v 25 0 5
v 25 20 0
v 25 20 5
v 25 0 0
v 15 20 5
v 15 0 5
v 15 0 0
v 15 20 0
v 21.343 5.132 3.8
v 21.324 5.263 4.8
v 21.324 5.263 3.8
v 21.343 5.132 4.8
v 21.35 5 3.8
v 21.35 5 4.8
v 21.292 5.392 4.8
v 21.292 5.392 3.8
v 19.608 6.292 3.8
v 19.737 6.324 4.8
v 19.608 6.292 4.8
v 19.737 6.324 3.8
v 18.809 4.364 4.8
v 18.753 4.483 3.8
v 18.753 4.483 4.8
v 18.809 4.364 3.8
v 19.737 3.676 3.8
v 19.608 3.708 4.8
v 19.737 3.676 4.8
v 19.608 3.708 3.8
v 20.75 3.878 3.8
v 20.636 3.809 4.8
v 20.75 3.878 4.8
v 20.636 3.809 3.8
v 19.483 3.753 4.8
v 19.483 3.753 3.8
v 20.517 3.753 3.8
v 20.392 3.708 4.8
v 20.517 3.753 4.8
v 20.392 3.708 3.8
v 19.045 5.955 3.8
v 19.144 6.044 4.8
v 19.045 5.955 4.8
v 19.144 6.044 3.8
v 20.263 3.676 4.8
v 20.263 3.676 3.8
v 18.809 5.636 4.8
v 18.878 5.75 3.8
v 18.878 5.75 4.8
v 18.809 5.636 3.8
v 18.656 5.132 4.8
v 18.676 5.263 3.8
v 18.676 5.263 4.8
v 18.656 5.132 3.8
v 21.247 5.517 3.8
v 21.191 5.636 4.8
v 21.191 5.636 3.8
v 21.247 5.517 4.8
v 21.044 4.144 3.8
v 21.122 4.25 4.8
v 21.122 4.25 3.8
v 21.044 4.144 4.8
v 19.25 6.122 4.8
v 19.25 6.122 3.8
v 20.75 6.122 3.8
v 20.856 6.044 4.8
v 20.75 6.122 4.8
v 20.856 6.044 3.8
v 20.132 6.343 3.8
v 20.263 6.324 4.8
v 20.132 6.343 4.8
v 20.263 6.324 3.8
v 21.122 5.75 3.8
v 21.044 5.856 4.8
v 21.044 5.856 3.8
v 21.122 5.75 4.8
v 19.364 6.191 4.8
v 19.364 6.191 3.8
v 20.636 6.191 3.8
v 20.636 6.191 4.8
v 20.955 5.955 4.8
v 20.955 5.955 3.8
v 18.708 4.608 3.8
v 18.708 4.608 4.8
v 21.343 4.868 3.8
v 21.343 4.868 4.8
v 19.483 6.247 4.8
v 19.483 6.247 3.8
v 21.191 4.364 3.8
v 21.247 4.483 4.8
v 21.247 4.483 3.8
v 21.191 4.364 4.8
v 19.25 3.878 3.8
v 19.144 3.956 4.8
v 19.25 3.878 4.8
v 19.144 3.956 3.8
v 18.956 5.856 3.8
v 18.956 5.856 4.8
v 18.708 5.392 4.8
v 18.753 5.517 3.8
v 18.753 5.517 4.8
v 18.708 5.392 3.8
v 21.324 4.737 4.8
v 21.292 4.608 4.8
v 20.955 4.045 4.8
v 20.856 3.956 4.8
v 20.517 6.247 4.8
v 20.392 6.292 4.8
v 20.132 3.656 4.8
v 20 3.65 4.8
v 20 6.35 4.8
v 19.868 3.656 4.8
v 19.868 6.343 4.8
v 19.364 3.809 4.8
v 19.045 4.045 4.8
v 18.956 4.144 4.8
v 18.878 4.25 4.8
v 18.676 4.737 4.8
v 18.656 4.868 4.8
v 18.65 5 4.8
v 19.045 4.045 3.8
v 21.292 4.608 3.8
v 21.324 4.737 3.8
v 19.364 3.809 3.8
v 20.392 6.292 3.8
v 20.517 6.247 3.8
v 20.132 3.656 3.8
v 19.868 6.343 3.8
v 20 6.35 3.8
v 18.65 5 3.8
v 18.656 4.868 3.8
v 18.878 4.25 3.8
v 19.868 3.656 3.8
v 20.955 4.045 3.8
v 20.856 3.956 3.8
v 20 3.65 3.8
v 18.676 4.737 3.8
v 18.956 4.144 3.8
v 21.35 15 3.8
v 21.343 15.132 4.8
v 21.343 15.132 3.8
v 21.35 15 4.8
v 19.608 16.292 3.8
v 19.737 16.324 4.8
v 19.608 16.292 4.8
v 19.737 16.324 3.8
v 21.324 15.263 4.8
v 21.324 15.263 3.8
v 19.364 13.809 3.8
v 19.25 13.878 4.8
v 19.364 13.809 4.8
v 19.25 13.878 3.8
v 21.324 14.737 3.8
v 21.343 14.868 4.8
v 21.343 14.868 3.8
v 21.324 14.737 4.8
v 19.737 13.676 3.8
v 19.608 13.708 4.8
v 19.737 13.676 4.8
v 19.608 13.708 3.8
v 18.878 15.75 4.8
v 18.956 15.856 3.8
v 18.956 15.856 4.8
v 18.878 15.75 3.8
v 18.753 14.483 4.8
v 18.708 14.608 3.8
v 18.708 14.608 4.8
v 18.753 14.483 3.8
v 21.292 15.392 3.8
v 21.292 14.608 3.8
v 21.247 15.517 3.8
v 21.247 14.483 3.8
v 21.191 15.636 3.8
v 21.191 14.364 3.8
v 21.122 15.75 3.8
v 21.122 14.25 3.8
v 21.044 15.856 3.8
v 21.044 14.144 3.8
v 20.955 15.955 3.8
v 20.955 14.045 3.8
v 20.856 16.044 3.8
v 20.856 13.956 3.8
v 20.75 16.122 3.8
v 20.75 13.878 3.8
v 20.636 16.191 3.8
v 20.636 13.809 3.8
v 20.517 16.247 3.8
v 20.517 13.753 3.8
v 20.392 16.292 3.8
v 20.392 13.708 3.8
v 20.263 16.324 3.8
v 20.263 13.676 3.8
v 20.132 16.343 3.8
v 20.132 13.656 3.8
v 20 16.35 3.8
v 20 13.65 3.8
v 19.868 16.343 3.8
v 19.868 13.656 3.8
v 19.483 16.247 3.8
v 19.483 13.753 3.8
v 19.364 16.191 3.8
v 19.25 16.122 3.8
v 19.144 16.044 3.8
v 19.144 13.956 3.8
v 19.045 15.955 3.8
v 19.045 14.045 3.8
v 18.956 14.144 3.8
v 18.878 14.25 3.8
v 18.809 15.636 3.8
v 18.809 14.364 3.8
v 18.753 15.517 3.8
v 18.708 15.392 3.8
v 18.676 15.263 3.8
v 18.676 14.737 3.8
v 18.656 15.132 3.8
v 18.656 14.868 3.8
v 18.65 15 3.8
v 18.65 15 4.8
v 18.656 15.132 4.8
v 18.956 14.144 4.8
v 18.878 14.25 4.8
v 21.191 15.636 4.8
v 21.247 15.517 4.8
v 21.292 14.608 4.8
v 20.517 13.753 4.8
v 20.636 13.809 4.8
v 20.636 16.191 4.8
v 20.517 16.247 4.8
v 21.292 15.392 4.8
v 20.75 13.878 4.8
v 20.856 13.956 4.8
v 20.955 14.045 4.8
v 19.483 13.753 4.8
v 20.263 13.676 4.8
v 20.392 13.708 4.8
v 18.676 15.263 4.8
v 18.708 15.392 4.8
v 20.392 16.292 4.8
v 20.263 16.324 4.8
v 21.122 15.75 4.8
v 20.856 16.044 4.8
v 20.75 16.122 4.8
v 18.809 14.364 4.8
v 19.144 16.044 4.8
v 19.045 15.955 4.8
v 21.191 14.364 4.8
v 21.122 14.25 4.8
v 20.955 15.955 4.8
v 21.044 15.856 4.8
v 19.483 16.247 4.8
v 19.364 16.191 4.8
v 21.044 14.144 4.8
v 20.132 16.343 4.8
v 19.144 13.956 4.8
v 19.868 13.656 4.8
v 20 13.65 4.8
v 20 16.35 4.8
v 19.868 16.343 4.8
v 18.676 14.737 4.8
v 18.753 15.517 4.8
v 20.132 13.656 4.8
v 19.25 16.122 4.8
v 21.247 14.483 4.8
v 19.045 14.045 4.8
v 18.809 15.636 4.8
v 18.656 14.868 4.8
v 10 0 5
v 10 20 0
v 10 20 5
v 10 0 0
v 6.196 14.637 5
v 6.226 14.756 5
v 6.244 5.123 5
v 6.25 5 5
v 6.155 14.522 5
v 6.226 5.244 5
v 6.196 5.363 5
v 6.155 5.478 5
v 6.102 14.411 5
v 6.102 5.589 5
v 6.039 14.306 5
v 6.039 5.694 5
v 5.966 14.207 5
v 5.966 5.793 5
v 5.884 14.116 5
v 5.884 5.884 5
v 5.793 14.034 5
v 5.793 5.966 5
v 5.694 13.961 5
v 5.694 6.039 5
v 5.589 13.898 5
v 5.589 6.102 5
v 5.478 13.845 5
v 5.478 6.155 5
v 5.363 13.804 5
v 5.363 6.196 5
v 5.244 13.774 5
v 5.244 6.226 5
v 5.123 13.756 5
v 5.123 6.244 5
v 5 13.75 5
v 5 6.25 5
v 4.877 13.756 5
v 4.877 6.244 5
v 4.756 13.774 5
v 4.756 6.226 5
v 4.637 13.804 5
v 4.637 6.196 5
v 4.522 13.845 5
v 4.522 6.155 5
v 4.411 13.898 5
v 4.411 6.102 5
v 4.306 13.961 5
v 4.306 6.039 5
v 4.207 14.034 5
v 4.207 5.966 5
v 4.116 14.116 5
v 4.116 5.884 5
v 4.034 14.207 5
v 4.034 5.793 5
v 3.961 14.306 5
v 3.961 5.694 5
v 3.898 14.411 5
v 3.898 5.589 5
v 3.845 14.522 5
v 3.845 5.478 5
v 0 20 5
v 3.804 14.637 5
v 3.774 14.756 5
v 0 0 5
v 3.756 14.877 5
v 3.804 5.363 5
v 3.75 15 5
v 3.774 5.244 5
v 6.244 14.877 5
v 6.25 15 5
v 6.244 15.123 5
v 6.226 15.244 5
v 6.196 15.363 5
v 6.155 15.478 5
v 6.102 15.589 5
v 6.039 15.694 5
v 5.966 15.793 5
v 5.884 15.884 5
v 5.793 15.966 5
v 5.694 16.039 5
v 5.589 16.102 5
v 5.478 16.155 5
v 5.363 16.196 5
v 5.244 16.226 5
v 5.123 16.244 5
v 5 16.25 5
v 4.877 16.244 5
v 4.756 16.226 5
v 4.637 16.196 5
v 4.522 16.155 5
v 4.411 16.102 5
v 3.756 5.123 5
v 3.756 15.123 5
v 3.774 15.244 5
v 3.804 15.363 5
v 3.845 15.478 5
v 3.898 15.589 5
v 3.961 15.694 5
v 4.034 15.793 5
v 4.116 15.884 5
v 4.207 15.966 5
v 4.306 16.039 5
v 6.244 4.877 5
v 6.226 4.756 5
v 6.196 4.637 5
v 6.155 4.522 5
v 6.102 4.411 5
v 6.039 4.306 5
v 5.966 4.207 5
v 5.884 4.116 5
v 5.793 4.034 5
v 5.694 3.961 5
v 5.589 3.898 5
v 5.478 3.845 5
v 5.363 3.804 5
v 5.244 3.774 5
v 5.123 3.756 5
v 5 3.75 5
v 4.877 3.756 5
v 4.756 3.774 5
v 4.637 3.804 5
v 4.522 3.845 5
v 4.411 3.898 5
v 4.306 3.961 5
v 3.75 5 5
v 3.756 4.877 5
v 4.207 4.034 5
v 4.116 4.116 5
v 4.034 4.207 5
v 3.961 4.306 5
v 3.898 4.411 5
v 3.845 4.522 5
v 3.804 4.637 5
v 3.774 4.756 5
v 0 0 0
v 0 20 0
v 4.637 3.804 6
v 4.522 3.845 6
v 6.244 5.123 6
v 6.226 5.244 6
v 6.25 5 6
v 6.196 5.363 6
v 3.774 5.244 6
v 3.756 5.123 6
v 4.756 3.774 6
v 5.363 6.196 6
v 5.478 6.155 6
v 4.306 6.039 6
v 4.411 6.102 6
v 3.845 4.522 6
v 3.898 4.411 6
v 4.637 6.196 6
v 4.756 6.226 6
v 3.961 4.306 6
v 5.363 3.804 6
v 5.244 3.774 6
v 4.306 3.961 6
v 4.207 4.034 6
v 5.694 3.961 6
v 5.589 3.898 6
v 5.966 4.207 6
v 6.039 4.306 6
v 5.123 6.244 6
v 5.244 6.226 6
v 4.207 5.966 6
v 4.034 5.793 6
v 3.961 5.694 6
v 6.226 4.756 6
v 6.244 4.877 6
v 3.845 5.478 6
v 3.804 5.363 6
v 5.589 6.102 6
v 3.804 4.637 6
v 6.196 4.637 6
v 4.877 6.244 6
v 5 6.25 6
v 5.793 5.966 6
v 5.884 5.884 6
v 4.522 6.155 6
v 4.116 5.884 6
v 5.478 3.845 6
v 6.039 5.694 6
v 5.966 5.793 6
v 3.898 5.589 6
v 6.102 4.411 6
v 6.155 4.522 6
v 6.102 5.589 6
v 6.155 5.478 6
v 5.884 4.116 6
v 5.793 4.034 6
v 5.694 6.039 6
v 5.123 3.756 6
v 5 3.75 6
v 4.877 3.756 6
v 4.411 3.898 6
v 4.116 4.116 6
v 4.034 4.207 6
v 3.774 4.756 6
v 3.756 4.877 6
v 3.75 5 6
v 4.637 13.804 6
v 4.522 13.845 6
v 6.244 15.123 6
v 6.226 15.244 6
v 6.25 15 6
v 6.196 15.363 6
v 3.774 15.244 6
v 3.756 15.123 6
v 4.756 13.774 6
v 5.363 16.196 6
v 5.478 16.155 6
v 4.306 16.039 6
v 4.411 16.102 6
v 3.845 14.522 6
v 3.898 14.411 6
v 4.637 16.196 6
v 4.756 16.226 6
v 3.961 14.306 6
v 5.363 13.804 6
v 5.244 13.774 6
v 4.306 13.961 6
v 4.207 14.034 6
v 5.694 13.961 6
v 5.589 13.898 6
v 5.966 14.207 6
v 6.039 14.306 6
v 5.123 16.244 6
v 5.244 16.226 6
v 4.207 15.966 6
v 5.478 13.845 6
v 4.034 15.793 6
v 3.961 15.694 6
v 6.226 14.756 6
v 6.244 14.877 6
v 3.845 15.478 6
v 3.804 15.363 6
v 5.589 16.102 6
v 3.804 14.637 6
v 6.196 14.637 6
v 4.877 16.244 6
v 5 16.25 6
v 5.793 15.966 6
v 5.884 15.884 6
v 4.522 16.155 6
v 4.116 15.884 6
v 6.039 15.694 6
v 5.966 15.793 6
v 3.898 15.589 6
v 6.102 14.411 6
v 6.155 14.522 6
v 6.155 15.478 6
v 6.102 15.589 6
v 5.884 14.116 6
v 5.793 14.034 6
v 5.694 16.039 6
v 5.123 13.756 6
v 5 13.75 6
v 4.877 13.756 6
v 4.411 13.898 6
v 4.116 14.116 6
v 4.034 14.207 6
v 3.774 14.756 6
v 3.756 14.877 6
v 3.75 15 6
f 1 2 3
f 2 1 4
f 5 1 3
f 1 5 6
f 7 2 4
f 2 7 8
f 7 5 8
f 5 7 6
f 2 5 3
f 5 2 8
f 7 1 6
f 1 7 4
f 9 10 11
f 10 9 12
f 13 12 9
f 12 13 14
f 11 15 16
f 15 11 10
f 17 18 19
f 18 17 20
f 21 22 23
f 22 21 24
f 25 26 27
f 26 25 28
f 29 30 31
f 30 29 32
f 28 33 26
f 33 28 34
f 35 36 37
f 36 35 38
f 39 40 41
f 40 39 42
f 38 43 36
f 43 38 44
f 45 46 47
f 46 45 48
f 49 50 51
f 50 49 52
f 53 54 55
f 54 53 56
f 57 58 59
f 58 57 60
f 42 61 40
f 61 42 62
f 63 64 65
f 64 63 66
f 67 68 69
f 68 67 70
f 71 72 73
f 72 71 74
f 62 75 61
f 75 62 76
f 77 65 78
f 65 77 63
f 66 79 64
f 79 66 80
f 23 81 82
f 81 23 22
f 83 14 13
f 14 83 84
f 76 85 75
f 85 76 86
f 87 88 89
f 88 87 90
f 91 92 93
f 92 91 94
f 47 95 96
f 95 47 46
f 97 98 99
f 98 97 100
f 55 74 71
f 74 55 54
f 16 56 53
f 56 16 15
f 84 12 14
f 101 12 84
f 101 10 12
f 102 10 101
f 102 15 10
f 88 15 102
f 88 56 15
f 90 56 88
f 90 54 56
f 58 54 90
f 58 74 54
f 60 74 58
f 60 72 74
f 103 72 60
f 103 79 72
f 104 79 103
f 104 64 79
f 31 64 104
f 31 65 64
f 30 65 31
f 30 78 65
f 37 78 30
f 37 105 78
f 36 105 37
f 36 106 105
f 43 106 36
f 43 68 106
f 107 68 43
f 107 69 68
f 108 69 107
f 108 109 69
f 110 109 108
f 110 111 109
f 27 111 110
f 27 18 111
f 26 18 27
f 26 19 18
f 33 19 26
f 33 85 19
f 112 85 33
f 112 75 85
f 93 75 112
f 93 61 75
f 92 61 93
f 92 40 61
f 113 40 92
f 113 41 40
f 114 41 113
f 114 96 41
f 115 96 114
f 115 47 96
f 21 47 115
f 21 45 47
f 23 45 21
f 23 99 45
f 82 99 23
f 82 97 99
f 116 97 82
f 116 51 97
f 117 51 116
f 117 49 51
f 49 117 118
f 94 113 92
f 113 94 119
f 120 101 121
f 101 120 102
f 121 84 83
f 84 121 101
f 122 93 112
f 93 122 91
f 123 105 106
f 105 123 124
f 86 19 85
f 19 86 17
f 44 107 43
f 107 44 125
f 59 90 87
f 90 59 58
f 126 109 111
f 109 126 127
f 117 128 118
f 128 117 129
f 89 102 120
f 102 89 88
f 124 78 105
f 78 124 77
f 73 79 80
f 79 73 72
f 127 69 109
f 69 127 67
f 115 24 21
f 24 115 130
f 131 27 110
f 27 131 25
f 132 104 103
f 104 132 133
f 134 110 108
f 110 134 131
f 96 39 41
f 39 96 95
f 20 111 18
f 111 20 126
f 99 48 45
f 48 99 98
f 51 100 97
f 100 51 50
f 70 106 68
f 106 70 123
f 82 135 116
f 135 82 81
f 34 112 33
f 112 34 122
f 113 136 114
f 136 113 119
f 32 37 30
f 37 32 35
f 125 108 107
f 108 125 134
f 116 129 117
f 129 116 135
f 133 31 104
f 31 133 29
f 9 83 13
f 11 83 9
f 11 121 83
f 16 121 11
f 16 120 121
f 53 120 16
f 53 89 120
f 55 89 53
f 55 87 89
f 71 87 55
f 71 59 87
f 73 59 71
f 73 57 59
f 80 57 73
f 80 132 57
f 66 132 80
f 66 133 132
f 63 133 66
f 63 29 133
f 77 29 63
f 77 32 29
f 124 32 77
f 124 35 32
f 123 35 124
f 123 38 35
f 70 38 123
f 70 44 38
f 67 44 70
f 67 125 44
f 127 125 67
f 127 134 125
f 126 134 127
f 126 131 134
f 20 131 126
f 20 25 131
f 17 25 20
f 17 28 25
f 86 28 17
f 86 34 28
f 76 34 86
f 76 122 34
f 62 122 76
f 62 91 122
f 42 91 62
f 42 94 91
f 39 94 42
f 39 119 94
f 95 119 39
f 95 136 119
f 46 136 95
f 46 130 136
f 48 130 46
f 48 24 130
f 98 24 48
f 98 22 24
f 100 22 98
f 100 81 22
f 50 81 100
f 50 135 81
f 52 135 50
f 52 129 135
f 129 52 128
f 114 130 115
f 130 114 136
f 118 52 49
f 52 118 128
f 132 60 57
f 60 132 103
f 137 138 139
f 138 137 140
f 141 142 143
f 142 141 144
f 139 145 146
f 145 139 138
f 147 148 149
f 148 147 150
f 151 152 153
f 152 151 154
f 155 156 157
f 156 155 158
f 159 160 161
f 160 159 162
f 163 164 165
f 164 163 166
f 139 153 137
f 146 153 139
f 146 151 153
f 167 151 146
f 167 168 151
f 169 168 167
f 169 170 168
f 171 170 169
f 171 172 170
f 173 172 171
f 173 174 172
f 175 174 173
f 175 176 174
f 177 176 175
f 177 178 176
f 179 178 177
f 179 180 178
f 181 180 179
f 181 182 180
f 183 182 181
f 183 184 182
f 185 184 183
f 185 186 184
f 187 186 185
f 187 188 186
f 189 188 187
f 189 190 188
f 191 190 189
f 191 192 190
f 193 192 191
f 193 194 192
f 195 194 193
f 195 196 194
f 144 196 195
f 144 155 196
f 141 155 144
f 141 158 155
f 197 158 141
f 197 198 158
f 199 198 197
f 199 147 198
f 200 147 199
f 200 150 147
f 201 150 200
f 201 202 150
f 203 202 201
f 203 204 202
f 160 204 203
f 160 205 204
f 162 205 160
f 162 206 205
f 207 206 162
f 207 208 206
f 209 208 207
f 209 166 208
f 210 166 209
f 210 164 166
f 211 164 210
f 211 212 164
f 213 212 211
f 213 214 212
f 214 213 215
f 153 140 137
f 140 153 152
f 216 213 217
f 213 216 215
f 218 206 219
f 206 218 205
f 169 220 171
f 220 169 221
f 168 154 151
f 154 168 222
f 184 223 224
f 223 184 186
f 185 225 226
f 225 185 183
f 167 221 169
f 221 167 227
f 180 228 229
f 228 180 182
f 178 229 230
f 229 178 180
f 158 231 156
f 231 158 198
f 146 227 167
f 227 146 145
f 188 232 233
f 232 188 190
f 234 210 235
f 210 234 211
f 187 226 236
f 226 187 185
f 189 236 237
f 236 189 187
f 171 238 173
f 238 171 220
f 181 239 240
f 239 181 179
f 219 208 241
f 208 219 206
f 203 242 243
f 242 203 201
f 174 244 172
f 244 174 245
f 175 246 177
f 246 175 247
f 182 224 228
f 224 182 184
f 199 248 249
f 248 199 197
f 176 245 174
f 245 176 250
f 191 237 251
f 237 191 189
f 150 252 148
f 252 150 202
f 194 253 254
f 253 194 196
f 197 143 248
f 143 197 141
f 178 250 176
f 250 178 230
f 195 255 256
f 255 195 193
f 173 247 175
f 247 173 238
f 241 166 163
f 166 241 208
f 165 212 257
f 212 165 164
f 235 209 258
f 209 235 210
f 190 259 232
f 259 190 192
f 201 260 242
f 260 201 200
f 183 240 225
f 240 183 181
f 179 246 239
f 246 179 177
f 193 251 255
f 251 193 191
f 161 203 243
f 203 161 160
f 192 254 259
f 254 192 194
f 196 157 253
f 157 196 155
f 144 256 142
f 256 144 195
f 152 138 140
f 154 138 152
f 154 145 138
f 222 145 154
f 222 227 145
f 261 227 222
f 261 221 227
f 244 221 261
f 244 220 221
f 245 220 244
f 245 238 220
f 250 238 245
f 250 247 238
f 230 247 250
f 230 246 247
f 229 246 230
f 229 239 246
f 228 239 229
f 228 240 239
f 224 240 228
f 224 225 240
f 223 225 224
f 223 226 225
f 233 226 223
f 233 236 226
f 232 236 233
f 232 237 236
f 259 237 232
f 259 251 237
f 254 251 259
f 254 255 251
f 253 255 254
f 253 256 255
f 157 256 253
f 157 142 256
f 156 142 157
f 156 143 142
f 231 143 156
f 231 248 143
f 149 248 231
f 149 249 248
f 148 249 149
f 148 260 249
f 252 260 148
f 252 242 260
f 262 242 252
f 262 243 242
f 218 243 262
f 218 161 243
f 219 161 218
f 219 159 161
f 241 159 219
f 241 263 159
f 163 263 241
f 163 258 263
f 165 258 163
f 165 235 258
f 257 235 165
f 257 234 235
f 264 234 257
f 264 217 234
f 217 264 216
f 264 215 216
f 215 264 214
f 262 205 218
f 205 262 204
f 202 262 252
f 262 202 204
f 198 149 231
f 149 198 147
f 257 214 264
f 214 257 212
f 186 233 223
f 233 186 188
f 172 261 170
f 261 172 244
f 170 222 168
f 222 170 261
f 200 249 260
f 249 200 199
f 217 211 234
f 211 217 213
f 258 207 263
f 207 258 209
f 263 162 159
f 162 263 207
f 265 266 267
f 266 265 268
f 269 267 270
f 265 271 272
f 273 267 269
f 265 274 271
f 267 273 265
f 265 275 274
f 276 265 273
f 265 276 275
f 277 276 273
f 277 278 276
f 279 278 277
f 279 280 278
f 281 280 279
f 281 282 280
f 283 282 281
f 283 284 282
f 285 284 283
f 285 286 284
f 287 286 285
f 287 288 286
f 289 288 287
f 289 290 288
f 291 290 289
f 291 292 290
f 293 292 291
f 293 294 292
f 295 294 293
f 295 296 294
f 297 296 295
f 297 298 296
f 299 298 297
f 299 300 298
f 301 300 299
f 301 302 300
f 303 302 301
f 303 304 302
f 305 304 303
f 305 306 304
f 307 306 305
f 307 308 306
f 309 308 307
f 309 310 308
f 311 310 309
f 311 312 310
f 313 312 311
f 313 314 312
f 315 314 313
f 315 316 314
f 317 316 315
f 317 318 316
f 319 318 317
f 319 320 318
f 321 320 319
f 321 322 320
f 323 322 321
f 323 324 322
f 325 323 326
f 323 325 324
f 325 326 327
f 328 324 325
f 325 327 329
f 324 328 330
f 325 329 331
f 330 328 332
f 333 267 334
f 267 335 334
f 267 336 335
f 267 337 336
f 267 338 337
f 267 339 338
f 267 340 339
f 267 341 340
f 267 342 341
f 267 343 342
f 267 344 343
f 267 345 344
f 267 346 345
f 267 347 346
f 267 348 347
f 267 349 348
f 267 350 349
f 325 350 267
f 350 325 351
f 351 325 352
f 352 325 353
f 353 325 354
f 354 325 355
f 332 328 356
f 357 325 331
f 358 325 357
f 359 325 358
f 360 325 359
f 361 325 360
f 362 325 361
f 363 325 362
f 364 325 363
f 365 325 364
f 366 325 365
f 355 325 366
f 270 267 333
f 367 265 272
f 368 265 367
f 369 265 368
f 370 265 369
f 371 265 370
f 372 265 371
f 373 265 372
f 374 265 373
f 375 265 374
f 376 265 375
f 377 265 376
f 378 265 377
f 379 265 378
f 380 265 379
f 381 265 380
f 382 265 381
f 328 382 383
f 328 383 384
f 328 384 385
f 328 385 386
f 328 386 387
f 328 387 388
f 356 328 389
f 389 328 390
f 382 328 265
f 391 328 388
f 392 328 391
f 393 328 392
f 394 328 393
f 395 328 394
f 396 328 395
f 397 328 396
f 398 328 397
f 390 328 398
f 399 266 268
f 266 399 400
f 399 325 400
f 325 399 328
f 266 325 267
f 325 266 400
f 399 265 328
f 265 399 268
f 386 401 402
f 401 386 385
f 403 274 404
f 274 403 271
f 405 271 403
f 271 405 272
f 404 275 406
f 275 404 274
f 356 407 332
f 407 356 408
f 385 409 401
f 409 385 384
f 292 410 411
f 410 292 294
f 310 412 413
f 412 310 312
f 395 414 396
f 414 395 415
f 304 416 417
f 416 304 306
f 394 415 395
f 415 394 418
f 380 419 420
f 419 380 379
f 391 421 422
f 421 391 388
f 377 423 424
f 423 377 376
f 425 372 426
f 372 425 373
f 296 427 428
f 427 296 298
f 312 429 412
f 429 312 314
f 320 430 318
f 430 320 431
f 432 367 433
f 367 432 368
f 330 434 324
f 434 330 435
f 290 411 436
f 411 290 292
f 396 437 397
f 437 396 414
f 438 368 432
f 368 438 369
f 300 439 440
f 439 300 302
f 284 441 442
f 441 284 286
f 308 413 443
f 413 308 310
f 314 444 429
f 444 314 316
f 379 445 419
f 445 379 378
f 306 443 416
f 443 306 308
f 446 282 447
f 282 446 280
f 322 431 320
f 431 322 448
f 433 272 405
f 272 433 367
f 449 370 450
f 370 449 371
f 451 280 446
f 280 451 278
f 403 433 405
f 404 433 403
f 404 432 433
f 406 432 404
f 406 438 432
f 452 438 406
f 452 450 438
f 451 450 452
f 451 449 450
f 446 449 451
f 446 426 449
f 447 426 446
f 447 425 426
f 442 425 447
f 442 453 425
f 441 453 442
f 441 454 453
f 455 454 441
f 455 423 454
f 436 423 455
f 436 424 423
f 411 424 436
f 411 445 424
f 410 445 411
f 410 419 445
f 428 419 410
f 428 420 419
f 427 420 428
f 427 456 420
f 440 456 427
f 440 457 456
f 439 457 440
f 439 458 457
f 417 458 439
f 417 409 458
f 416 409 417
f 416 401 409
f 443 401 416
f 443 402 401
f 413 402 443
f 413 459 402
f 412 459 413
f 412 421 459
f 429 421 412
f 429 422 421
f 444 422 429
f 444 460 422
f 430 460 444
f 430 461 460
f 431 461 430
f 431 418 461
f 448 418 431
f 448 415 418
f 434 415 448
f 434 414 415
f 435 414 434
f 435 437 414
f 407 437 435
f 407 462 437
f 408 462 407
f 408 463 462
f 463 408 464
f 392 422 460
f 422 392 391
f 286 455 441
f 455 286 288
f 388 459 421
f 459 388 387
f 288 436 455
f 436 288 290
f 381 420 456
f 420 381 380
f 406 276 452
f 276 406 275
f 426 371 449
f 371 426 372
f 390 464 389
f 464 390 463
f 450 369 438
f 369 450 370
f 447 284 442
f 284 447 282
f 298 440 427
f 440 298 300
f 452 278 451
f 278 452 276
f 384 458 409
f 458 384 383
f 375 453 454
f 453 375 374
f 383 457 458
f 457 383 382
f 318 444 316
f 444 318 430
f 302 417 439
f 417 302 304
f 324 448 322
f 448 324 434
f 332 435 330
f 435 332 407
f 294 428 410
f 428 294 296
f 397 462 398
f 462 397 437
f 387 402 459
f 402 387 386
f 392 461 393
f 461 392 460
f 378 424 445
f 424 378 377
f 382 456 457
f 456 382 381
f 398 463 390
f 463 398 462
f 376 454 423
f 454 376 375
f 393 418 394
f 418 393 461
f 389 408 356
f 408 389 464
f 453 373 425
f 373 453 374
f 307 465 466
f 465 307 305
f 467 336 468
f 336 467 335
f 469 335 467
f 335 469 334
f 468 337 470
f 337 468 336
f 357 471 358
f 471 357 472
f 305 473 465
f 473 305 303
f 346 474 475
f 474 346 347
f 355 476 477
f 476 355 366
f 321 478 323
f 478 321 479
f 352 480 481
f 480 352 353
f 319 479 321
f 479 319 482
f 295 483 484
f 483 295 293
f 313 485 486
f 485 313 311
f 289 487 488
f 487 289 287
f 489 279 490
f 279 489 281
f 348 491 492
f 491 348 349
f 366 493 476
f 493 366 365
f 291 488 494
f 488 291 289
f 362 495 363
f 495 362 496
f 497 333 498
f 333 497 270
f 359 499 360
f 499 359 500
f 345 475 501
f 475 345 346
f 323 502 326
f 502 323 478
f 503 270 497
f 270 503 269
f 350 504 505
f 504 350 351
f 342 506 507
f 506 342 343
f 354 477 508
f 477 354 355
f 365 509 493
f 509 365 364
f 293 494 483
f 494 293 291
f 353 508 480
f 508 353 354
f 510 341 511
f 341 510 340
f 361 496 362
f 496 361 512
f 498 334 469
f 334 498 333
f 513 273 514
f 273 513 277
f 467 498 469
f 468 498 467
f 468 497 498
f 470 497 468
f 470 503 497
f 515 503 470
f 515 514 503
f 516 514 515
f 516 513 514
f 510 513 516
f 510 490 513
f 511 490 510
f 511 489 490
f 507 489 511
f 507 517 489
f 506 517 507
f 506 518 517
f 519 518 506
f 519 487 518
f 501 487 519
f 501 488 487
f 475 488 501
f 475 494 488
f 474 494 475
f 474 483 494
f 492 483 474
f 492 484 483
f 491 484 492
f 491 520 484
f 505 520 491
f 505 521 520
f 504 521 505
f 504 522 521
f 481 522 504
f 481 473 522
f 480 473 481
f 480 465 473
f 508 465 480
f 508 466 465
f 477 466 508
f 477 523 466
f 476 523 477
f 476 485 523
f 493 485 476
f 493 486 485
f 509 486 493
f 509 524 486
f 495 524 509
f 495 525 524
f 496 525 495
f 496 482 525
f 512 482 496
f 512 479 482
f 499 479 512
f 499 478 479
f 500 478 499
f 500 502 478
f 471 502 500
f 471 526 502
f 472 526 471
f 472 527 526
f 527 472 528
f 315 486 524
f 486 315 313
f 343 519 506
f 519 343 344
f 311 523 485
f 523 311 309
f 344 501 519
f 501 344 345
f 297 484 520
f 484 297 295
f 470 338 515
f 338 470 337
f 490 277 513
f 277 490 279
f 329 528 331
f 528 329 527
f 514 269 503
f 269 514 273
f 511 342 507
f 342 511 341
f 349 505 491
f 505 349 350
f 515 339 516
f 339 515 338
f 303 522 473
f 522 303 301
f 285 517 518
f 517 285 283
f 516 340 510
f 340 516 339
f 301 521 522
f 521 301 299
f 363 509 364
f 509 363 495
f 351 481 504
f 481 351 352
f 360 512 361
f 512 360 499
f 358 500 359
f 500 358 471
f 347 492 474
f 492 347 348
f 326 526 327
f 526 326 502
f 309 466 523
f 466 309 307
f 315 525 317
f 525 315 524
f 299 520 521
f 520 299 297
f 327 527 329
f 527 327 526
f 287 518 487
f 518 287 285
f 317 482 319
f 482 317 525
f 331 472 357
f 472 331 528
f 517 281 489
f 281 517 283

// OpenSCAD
// another clearence test
// 26.10.2025 Sebastian Weigl

$fn=64;

// bottom part
cube([10,20,5]);
translate([5,5,5])
cylinder(h=1,d=2.5,true);
translate([5,15,5])
cylinder(h=1,d=2.5,true);

// top part
difference(){
translate([15,0,0])
cube([10,20,5]);
translate([20,5,3.8])
cylinder(h=1.2,d=2.7,true);
translate([20,15,3.8])
#cylinder(h=1.2,d=2.7,true);
}
